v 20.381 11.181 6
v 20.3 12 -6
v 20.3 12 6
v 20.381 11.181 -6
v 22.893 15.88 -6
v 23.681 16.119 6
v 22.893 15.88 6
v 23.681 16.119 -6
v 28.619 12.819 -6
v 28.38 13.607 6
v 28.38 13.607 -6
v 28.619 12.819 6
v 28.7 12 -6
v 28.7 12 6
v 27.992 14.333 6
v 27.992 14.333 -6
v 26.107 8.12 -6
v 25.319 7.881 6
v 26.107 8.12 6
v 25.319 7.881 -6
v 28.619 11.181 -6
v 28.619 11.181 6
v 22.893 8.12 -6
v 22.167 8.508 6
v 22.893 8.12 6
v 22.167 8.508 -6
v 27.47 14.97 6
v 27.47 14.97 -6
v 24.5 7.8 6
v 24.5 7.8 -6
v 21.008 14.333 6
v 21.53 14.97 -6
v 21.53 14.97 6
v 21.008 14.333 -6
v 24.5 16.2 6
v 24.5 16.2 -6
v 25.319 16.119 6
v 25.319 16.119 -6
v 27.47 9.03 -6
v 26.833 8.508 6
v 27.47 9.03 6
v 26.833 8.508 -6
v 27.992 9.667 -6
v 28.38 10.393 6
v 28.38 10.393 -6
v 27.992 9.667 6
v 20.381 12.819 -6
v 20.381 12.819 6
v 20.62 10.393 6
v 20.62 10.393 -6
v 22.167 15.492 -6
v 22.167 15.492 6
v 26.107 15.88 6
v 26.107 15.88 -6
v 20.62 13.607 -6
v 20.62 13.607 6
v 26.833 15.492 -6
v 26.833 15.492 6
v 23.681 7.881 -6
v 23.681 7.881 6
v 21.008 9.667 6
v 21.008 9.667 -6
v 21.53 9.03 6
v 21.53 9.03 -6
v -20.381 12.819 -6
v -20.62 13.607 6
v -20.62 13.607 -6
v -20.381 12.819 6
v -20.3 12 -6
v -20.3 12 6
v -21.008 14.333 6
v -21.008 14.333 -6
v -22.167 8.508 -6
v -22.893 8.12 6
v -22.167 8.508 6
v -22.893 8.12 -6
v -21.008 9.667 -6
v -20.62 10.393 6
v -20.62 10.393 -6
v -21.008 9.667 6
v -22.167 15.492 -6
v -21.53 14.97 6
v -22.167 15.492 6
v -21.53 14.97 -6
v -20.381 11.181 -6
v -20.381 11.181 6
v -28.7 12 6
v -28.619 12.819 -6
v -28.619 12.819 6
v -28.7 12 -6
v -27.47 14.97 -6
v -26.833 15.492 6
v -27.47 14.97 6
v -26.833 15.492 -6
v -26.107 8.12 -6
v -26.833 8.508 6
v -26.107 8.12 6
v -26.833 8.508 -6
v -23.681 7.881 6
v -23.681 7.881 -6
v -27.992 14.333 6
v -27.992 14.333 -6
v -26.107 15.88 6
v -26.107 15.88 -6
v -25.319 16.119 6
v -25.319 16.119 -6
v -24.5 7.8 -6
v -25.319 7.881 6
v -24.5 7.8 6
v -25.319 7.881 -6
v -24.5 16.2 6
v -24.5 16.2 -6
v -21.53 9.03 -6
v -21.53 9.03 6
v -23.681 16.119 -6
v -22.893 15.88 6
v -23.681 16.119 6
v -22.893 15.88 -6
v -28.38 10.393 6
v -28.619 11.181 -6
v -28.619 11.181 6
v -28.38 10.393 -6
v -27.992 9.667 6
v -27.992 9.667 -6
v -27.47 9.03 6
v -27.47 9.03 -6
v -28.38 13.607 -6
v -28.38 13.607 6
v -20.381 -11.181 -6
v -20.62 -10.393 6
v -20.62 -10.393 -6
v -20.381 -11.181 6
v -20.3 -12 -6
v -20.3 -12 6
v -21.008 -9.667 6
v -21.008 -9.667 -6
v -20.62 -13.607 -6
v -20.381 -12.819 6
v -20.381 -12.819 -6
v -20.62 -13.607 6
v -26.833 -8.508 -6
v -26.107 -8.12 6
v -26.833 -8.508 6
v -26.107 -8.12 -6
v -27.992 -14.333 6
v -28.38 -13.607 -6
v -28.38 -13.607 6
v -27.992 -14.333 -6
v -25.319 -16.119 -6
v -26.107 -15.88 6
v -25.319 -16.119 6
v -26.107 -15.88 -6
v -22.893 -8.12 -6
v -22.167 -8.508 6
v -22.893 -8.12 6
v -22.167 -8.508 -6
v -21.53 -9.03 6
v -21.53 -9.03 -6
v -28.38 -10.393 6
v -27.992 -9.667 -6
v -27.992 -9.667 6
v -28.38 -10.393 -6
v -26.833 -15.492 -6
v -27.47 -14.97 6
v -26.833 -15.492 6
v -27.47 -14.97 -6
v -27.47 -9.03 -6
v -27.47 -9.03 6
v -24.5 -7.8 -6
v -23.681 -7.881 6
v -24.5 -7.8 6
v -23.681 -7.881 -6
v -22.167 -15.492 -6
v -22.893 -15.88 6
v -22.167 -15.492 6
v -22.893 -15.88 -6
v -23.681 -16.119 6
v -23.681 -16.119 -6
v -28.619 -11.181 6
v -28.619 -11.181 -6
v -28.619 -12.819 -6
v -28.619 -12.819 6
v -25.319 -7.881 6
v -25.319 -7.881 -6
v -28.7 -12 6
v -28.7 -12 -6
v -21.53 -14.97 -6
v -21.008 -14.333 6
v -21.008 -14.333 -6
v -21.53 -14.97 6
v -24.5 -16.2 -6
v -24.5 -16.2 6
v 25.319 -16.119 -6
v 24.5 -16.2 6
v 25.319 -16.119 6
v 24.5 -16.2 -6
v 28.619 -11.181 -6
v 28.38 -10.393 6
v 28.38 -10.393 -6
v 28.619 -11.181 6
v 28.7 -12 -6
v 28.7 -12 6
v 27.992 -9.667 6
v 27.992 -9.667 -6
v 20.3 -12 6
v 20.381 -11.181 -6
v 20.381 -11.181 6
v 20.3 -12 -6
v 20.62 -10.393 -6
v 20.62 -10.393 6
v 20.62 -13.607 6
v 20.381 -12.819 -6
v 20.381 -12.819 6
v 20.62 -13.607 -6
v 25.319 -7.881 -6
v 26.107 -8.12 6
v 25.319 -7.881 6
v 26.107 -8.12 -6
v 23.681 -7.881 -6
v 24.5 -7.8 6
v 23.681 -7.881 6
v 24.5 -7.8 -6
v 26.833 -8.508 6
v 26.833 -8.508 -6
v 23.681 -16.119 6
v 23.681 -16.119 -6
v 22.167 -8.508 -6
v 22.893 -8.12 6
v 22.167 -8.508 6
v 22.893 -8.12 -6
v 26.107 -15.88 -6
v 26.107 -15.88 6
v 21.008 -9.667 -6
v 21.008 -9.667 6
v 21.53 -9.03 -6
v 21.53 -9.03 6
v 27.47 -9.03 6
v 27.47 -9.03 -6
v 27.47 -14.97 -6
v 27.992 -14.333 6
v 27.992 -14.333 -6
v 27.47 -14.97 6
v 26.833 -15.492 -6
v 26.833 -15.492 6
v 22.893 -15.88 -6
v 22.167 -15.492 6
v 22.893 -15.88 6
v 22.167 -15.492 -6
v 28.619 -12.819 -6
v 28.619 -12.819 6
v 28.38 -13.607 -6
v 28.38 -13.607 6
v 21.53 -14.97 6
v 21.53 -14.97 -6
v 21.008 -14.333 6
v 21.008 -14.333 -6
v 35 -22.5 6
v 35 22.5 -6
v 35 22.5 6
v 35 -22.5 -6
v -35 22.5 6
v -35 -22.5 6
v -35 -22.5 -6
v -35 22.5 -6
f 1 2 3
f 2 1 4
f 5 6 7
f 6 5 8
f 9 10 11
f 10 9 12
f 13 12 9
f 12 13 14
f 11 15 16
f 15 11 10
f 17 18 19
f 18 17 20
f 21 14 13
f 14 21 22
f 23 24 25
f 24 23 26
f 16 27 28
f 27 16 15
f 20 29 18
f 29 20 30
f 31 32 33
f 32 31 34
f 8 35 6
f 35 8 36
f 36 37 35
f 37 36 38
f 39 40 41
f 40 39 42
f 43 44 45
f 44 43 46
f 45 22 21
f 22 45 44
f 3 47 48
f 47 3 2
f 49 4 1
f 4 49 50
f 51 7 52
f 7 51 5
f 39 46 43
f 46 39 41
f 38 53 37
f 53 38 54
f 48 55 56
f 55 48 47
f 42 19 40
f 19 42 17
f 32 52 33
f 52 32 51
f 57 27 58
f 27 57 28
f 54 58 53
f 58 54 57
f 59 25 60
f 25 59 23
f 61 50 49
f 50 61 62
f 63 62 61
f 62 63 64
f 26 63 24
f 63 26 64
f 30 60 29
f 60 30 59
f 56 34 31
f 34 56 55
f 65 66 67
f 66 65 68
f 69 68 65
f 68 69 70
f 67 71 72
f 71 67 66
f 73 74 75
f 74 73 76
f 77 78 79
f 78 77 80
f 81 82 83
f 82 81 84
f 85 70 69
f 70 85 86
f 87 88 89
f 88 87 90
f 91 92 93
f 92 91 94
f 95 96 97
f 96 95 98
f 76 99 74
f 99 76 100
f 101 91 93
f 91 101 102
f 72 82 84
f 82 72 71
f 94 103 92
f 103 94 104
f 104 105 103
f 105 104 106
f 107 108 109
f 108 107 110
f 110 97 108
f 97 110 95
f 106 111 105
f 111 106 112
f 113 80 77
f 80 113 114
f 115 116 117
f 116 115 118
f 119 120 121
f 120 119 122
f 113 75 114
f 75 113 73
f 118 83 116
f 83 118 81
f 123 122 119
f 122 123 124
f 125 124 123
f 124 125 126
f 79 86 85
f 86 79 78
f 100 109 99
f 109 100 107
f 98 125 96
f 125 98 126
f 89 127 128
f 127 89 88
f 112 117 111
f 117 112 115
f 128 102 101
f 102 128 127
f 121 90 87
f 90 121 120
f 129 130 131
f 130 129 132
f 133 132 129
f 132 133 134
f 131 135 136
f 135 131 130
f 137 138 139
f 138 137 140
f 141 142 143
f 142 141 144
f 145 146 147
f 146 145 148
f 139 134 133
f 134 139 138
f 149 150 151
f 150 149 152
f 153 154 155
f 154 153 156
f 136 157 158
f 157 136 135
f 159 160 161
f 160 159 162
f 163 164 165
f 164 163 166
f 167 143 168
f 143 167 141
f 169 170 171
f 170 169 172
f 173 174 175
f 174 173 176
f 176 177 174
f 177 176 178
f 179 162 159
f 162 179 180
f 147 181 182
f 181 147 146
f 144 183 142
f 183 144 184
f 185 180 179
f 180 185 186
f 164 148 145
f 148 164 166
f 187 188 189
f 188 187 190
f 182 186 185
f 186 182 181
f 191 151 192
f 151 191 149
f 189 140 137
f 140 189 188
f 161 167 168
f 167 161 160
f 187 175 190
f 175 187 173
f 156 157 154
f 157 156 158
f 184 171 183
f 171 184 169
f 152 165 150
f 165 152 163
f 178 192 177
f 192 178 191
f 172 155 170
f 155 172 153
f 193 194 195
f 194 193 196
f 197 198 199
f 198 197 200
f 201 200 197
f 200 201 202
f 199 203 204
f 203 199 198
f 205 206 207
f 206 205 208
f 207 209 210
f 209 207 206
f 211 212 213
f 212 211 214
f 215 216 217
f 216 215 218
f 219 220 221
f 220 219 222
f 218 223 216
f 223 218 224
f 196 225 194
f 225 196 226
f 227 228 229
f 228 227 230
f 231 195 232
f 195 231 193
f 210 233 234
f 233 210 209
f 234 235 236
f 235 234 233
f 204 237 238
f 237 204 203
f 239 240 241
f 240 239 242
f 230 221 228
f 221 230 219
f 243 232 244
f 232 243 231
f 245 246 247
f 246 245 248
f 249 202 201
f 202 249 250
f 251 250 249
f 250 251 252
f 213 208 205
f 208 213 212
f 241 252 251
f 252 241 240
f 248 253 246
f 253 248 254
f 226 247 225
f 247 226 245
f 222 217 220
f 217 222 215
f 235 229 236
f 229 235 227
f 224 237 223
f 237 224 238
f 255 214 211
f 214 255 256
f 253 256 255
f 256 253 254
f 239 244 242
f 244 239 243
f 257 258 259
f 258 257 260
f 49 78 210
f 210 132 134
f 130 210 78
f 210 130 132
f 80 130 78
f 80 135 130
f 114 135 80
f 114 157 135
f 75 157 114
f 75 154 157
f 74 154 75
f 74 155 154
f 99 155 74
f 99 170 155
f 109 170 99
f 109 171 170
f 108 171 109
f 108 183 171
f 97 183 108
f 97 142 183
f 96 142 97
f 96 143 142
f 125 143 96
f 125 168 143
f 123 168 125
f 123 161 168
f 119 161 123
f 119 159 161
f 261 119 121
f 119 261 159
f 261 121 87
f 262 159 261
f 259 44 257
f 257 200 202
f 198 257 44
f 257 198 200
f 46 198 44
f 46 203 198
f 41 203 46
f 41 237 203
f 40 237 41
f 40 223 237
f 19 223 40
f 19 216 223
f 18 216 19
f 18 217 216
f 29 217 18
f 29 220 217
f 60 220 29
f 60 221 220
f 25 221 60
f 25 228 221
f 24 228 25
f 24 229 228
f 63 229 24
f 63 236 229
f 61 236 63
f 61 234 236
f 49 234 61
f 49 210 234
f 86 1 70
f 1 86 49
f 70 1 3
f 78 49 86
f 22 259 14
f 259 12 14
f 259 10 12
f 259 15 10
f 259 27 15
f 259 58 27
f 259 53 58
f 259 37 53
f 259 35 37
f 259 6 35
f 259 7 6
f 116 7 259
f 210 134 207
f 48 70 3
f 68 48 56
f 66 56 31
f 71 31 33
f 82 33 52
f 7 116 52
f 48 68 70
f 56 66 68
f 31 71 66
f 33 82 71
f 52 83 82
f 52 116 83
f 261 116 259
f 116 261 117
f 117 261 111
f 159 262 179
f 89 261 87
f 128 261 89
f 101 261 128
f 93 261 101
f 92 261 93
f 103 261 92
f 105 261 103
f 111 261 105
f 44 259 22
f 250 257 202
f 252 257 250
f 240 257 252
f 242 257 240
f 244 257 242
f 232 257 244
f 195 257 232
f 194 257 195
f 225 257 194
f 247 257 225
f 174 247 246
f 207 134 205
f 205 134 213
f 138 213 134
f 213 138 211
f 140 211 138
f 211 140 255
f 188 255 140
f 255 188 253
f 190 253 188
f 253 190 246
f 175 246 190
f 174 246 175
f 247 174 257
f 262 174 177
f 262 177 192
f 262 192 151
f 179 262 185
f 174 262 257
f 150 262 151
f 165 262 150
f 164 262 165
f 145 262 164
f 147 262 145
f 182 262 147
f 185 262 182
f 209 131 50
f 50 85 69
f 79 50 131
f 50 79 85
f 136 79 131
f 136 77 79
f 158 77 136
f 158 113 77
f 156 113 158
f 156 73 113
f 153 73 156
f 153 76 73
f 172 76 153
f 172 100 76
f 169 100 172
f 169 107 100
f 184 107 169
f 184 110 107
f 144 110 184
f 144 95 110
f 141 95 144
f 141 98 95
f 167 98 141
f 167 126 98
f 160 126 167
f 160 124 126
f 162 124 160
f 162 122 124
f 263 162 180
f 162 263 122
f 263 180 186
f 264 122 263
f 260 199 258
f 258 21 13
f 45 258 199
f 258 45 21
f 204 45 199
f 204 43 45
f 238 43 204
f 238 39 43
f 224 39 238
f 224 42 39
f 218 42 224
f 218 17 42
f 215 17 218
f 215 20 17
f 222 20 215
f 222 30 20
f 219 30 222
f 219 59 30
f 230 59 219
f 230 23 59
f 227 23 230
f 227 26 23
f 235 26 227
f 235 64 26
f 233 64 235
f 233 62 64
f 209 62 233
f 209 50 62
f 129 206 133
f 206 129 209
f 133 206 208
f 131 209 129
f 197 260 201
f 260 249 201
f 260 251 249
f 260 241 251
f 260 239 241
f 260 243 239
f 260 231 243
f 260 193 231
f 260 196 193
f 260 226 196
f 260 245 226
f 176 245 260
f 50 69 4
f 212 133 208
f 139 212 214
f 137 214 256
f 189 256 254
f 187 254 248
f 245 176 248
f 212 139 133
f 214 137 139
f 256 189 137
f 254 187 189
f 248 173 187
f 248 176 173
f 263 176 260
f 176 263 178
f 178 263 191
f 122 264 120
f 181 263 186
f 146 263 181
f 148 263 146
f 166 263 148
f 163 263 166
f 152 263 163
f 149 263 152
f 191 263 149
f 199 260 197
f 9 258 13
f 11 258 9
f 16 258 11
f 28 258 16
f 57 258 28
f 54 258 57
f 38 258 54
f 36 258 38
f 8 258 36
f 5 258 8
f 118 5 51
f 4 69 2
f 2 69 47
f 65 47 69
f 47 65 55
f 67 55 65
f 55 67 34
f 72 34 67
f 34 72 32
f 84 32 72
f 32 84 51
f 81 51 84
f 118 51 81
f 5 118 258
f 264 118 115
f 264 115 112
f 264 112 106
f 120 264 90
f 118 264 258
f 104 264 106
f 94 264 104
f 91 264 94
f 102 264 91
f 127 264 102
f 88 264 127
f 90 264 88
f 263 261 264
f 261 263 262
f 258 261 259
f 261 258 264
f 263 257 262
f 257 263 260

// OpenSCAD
$fn = 32;

// ----------------------------------------------------------------------
// Corner plate 70 x 45 x 12
// 4 holes, centres taken from the edge offset
// ----------------------------------------------------------------------

// --- parameters (mm) ---
plate = [70, 45, 12];  // overall size (x, y, z)
holes = 4;             // number of holes the drawing asks for
hole_d = 8.4;          // hole diameter
edge = 10.5;           // hole centre offset from the plate edge

// --- derived feature positions (mm) ---
corner_x = plate[0] / 2 - edge;  // = 24.5   corner hole X
corner_y = plate[1] / 2 - edge;  // = 12   corner hole Y
feature_centers = [
  [corner_x, corner_y],
  [-corner_x, corner_y],
  [-corner_x, -corner_y],
  [corner_x, -corner_y]
];   // hole centres the loop below drills

// plate outline, every hole drilled through with the same cutters
difference() {
  cube(plate, center = true);
  for (centre = feature_centers)
    translate([centre[0], centre[1], 0])
      cylinder(d = hole_d, h = plate[2] + 2, center = true);
}
